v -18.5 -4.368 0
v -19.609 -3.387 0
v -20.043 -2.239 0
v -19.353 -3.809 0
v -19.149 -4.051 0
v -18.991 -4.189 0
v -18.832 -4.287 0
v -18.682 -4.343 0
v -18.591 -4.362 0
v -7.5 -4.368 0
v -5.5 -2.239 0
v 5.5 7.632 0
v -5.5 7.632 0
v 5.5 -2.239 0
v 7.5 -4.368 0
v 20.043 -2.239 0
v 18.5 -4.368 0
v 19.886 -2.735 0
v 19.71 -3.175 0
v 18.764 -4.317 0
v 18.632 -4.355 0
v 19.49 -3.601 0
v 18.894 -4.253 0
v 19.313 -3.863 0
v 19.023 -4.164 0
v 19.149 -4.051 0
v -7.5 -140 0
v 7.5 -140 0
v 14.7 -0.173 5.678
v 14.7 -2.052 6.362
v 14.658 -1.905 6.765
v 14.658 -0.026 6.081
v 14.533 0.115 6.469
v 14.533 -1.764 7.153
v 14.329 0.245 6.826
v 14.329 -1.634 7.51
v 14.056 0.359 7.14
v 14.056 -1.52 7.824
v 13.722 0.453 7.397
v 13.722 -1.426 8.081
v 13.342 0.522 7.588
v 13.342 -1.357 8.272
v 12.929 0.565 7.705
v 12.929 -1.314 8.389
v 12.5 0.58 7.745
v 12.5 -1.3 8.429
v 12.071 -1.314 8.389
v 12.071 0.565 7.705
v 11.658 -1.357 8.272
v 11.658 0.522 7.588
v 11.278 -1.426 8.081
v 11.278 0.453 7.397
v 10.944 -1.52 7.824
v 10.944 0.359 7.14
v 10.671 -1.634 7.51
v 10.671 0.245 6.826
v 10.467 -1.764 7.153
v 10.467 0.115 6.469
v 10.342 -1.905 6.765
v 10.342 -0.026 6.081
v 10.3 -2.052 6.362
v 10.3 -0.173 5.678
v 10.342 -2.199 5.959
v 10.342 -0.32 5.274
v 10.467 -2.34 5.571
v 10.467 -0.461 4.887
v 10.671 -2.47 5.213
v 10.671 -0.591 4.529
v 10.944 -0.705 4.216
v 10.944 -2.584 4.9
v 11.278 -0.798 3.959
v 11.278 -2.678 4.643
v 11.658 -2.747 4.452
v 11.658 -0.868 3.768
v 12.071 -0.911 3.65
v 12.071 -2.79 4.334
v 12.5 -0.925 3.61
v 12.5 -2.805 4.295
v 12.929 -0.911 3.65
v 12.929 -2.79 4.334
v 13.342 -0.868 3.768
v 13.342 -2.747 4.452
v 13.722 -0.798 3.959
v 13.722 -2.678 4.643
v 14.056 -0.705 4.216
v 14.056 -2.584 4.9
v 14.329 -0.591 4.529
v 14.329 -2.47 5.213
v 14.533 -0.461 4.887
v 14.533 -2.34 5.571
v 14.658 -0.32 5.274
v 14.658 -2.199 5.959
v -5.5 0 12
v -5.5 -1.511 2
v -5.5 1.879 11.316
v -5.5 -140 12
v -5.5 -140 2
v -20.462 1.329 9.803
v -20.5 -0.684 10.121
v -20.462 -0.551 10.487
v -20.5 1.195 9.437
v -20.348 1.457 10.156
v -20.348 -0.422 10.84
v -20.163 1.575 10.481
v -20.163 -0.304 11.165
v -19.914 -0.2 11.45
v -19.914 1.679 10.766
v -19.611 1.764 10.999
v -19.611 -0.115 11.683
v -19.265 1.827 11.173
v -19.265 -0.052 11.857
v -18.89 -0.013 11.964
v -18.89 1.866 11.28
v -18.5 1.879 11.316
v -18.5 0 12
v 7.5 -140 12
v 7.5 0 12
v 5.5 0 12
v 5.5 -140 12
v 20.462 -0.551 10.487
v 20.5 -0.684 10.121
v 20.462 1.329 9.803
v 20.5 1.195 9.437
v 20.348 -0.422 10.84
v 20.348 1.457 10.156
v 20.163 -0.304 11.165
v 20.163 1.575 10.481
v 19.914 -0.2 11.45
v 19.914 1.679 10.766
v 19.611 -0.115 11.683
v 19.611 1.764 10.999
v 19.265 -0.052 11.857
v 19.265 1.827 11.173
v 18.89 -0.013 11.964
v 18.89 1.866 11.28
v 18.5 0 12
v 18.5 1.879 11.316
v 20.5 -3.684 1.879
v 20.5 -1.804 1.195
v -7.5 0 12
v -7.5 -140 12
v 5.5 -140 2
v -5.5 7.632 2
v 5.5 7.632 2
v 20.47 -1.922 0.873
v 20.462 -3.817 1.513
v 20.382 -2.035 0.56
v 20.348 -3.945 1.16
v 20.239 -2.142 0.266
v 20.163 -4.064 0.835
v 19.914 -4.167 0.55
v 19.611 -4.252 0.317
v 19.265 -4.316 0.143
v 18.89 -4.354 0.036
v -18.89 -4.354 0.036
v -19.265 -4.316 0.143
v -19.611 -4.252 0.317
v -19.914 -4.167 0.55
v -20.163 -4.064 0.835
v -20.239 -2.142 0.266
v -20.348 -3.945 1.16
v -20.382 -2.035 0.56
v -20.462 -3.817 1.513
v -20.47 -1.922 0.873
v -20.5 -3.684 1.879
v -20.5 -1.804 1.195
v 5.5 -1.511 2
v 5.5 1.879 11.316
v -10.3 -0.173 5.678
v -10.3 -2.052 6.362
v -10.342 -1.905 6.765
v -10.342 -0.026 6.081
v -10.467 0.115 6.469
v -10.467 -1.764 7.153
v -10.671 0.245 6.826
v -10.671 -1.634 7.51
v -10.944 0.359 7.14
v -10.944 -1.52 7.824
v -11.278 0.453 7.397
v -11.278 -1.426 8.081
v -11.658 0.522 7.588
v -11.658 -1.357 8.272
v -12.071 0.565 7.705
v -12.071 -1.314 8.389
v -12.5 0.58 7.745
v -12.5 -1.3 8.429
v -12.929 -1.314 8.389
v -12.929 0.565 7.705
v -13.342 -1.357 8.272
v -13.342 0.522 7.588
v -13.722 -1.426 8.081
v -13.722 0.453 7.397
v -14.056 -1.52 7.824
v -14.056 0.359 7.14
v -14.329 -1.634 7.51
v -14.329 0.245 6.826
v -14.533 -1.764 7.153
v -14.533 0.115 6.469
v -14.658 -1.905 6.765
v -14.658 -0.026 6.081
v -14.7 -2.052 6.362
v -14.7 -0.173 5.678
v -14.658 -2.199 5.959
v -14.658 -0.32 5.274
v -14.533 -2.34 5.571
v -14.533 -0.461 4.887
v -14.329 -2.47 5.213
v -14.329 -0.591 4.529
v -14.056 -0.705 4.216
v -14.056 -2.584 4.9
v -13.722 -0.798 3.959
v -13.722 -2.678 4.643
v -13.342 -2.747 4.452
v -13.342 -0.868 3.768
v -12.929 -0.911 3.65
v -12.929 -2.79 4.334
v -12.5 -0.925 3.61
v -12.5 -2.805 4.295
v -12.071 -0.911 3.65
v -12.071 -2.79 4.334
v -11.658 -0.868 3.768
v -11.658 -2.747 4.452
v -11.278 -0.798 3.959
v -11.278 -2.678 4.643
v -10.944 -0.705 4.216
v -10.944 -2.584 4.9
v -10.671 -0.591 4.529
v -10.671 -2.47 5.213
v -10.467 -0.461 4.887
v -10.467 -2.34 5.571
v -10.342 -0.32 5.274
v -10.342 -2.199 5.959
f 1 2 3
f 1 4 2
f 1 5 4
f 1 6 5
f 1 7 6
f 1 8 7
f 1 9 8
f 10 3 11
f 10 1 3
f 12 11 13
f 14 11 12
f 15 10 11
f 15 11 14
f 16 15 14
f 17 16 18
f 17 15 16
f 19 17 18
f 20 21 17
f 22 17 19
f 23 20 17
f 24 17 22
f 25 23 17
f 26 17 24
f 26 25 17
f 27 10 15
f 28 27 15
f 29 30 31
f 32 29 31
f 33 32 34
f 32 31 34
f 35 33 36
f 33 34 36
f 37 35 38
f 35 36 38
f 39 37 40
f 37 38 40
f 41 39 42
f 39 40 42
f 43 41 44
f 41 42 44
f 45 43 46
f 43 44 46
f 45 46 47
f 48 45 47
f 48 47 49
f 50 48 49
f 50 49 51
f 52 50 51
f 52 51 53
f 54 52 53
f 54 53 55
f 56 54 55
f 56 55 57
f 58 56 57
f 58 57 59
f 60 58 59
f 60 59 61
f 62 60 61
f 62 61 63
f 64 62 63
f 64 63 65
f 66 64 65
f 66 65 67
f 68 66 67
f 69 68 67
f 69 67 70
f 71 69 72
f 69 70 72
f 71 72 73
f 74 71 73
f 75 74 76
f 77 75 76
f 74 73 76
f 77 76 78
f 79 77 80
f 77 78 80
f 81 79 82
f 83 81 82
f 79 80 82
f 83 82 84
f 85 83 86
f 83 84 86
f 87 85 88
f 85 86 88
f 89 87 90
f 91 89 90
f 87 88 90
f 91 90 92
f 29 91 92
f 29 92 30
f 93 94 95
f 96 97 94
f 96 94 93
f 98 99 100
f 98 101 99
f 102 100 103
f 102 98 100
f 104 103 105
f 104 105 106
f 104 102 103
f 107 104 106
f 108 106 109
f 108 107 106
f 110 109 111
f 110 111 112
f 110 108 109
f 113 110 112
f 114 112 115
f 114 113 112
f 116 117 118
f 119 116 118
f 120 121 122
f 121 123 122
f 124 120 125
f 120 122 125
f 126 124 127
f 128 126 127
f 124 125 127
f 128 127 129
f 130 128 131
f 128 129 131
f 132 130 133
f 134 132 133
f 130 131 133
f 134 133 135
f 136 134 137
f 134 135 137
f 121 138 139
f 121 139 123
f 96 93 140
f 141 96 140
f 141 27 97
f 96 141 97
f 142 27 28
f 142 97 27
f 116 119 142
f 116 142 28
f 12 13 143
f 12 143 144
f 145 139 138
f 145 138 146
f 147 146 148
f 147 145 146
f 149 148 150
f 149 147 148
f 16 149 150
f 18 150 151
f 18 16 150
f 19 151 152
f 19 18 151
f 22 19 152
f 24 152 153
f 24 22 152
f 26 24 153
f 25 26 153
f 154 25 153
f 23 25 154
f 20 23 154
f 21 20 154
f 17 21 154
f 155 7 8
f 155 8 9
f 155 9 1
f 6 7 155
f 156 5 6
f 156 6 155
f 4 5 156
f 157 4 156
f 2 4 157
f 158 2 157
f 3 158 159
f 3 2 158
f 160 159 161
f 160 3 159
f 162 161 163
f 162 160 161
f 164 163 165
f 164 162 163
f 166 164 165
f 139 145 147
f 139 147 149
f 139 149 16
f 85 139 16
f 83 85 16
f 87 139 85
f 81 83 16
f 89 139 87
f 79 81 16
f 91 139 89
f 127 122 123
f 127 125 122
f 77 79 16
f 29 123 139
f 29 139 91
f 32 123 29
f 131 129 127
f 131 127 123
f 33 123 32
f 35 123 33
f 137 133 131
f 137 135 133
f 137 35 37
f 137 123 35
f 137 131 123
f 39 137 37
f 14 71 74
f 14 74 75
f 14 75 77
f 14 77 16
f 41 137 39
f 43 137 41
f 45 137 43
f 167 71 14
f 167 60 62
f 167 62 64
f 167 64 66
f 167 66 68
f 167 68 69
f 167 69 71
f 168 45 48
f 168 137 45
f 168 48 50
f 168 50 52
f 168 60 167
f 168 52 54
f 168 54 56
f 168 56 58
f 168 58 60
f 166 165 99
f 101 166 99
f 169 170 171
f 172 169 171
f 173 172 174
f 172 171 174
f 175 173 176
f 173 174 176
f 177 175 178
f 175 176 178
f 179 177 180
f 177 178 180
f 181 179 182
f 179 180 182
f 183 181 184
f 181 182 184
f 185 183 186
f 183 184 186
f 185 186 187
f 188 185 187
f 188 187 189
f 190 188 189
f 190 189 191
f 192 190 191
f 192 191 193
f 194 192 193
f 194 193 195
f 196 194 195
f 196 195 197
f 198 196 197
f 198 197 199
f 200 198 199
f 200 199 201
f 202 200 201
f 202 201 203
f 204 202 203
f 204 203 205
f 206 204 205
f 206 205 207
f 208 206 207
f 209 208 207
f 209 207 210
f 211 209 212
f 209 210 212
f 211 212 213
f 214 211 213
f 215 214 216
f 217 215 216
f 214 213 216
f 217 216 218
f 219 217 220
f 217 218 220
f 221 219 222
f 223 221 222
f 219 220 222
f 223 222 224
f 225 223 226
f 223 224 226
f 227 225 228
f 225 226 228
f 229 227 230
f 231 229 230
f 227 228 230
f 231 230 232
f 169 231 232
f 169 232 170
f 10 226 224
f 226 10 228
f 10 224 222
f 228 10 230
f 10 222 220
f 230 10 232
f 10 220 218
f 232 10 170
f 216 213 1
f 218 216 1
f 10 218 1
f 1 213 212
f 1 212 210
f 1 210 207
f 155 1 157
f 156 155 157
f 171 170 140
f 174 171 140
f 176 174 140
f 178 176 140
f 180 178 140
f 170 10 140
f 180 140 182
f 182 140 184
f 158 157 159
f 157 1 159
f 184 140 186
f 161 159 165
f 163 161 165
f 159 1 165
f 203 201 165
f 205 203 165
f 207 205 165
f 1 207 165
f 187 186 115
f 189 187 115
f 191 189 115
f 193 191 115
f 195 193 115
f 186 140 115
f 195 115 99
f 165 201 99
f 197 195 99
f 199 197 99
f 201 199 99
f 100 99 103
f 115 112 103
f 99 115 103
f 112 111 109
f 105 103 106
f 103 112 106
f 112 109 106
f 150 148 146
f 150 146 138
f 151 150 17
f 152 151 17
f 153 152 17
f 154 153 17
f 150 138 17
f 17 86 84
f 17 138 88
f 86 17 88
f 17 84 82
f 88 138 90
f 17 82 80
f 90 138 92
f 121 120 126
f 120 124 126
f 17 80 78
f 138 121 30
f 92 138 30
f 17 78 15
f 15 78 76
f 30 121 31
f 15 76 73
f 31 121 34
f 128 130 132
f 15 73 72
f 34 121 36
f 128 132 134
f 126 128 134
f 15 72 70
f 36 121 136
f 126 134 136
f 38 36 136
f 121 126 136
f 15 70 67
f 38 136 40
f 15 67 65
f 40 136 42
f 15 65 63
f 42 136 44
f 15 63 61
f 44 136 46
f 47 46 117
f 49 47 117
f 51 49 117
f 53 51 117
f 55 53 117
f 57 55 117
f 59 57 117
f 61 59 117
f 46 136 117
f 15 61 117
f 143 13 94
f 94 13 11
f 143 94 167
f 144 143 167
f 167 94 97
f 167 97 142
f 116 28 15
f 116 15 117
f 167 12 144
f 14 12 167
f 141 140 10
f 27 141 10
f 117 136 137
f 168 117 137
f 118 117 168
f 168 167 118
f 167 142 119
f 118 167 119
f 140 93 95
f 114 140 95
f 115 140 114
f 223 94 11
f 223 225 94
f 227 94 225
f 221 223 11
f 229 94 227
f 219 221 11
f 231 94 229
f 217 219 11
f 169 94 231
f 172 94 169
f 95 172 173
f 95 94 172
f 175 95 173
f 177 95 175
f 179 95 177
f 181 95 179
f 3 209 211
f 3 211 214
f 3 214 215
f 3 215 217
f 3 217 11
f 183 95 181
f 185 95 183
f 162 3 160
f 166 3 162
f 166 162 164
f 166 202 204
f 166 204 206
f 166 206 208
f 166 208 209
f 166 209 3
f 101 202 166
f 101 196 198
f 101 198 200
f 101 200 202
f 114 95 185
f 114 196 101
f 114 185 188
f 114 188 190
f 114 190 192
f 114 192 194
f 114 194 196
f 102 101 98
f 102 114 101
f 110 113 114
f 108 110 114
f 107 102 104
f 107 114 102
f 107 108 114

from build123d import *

# Parameters (mm, degrees)
F1_DEPTH  = 140
F3_DEPTH  = 25
F4_W      = 14.9999646693
F4_H      = 12.7701332697
F4_W_2    = 15
F5_DEPTH  = 2
F6_R      = 2
F7_W      = 11
F7_H      = 12
F8_DEPTH  = 2
F10_DEPTH = 50
F12_D     = 4.4


with BuildPart() as f1:
    # F0 (on Front) → F1 (new body)
    with BuildSketch(Plane.XZ):
        Polygon((-5.5, 12), (-7.5, 12), (-7.5, 0), (7.5, 0), (7.5, 12), (5.5, 12), (5.5, 2), (-5.5, 2), align=None)
    extrude(amount=F1_DEPTH)

    # F2 (on face) → F3 (cut)
    with BuildSketch(Plane(origin=(-7.5, 0, 0), x_dir=(0, -1, 0), z_dir=(-1, 0, 0))):
        Polygon((4.3676428112, 0), (0, 12), (0, 0), align=None)
    extrude(amount=-F3_DEPTH, mode=Mode.SUBTRACT)

    # F4 (on face) → F5 (join)
    with BuildSketch(Plane(origin=(0, -3.8567256581, 1.4037333413), x_dir=(-1, 0, 0), z_dir=(0, 0.9396926208, -0.3420201433))):
        with Locations((-12.9999823347, 4.8912448146)):
            Rectangle(F4_W, F4_H)
        with Locations((13, 4.8912448146)):
            Rectangle(F4_W_2, F4_H)
    extrude(amount=F5_DEPTH)

    # F6
    f6_edges = [f1.edges().sort_by_distance(p)[0] for p in [
        (20.499965, 0.939693, 11.65798),
        (-20.5, 0.939693, 11.65798),
        (20.499965, -3.42795, -0.34202),
        (-20.5, -3.42795, -0.34202),
    ]]
    fillet(f6_edges, radius=F6_R)

    # F7 (on face) → F8 (join)
    with BuildSketch(Plane(origin=(0, 0, 0), x_dir=(1, 0, 0), z_dir=(0, 0, -1))):
        with Locations((0, -1.6323571888)):
            Rectangle(F7_W, F7_H)
    extrude(amount=-F8_DEPTH)

    # F9 (on face) → F10 (cut, symmetric)
    with BuildSketch(Plane(origin=(-5.5, 0, 0), x_dir=(0, -1, 0), z_dir=(-1, 0, 0))):
        Polygon((2.2392872662, 0), (-7.6323571888, 0), (-7.6323571888, -1.849311986), (7.0655047894, -1.849311986), (7.0655047894, 0), align=None)
    extrude(amount=F10_DEPTH, both=True, mode=Mode.SUBTRACT)

    # F12 (through all)
    with Locations(Plane(origin=(0, -1.9773404165, 0.7196930546), x_dir=(-1, 0, 0), z_dir=(0, 0.9396926208, -0.3420201433))):
        with Locations((-12.5, 5.2763114494), (12.5, 5.2763114494)):
            Hole(F12_D / 2)


solid = f1.part
